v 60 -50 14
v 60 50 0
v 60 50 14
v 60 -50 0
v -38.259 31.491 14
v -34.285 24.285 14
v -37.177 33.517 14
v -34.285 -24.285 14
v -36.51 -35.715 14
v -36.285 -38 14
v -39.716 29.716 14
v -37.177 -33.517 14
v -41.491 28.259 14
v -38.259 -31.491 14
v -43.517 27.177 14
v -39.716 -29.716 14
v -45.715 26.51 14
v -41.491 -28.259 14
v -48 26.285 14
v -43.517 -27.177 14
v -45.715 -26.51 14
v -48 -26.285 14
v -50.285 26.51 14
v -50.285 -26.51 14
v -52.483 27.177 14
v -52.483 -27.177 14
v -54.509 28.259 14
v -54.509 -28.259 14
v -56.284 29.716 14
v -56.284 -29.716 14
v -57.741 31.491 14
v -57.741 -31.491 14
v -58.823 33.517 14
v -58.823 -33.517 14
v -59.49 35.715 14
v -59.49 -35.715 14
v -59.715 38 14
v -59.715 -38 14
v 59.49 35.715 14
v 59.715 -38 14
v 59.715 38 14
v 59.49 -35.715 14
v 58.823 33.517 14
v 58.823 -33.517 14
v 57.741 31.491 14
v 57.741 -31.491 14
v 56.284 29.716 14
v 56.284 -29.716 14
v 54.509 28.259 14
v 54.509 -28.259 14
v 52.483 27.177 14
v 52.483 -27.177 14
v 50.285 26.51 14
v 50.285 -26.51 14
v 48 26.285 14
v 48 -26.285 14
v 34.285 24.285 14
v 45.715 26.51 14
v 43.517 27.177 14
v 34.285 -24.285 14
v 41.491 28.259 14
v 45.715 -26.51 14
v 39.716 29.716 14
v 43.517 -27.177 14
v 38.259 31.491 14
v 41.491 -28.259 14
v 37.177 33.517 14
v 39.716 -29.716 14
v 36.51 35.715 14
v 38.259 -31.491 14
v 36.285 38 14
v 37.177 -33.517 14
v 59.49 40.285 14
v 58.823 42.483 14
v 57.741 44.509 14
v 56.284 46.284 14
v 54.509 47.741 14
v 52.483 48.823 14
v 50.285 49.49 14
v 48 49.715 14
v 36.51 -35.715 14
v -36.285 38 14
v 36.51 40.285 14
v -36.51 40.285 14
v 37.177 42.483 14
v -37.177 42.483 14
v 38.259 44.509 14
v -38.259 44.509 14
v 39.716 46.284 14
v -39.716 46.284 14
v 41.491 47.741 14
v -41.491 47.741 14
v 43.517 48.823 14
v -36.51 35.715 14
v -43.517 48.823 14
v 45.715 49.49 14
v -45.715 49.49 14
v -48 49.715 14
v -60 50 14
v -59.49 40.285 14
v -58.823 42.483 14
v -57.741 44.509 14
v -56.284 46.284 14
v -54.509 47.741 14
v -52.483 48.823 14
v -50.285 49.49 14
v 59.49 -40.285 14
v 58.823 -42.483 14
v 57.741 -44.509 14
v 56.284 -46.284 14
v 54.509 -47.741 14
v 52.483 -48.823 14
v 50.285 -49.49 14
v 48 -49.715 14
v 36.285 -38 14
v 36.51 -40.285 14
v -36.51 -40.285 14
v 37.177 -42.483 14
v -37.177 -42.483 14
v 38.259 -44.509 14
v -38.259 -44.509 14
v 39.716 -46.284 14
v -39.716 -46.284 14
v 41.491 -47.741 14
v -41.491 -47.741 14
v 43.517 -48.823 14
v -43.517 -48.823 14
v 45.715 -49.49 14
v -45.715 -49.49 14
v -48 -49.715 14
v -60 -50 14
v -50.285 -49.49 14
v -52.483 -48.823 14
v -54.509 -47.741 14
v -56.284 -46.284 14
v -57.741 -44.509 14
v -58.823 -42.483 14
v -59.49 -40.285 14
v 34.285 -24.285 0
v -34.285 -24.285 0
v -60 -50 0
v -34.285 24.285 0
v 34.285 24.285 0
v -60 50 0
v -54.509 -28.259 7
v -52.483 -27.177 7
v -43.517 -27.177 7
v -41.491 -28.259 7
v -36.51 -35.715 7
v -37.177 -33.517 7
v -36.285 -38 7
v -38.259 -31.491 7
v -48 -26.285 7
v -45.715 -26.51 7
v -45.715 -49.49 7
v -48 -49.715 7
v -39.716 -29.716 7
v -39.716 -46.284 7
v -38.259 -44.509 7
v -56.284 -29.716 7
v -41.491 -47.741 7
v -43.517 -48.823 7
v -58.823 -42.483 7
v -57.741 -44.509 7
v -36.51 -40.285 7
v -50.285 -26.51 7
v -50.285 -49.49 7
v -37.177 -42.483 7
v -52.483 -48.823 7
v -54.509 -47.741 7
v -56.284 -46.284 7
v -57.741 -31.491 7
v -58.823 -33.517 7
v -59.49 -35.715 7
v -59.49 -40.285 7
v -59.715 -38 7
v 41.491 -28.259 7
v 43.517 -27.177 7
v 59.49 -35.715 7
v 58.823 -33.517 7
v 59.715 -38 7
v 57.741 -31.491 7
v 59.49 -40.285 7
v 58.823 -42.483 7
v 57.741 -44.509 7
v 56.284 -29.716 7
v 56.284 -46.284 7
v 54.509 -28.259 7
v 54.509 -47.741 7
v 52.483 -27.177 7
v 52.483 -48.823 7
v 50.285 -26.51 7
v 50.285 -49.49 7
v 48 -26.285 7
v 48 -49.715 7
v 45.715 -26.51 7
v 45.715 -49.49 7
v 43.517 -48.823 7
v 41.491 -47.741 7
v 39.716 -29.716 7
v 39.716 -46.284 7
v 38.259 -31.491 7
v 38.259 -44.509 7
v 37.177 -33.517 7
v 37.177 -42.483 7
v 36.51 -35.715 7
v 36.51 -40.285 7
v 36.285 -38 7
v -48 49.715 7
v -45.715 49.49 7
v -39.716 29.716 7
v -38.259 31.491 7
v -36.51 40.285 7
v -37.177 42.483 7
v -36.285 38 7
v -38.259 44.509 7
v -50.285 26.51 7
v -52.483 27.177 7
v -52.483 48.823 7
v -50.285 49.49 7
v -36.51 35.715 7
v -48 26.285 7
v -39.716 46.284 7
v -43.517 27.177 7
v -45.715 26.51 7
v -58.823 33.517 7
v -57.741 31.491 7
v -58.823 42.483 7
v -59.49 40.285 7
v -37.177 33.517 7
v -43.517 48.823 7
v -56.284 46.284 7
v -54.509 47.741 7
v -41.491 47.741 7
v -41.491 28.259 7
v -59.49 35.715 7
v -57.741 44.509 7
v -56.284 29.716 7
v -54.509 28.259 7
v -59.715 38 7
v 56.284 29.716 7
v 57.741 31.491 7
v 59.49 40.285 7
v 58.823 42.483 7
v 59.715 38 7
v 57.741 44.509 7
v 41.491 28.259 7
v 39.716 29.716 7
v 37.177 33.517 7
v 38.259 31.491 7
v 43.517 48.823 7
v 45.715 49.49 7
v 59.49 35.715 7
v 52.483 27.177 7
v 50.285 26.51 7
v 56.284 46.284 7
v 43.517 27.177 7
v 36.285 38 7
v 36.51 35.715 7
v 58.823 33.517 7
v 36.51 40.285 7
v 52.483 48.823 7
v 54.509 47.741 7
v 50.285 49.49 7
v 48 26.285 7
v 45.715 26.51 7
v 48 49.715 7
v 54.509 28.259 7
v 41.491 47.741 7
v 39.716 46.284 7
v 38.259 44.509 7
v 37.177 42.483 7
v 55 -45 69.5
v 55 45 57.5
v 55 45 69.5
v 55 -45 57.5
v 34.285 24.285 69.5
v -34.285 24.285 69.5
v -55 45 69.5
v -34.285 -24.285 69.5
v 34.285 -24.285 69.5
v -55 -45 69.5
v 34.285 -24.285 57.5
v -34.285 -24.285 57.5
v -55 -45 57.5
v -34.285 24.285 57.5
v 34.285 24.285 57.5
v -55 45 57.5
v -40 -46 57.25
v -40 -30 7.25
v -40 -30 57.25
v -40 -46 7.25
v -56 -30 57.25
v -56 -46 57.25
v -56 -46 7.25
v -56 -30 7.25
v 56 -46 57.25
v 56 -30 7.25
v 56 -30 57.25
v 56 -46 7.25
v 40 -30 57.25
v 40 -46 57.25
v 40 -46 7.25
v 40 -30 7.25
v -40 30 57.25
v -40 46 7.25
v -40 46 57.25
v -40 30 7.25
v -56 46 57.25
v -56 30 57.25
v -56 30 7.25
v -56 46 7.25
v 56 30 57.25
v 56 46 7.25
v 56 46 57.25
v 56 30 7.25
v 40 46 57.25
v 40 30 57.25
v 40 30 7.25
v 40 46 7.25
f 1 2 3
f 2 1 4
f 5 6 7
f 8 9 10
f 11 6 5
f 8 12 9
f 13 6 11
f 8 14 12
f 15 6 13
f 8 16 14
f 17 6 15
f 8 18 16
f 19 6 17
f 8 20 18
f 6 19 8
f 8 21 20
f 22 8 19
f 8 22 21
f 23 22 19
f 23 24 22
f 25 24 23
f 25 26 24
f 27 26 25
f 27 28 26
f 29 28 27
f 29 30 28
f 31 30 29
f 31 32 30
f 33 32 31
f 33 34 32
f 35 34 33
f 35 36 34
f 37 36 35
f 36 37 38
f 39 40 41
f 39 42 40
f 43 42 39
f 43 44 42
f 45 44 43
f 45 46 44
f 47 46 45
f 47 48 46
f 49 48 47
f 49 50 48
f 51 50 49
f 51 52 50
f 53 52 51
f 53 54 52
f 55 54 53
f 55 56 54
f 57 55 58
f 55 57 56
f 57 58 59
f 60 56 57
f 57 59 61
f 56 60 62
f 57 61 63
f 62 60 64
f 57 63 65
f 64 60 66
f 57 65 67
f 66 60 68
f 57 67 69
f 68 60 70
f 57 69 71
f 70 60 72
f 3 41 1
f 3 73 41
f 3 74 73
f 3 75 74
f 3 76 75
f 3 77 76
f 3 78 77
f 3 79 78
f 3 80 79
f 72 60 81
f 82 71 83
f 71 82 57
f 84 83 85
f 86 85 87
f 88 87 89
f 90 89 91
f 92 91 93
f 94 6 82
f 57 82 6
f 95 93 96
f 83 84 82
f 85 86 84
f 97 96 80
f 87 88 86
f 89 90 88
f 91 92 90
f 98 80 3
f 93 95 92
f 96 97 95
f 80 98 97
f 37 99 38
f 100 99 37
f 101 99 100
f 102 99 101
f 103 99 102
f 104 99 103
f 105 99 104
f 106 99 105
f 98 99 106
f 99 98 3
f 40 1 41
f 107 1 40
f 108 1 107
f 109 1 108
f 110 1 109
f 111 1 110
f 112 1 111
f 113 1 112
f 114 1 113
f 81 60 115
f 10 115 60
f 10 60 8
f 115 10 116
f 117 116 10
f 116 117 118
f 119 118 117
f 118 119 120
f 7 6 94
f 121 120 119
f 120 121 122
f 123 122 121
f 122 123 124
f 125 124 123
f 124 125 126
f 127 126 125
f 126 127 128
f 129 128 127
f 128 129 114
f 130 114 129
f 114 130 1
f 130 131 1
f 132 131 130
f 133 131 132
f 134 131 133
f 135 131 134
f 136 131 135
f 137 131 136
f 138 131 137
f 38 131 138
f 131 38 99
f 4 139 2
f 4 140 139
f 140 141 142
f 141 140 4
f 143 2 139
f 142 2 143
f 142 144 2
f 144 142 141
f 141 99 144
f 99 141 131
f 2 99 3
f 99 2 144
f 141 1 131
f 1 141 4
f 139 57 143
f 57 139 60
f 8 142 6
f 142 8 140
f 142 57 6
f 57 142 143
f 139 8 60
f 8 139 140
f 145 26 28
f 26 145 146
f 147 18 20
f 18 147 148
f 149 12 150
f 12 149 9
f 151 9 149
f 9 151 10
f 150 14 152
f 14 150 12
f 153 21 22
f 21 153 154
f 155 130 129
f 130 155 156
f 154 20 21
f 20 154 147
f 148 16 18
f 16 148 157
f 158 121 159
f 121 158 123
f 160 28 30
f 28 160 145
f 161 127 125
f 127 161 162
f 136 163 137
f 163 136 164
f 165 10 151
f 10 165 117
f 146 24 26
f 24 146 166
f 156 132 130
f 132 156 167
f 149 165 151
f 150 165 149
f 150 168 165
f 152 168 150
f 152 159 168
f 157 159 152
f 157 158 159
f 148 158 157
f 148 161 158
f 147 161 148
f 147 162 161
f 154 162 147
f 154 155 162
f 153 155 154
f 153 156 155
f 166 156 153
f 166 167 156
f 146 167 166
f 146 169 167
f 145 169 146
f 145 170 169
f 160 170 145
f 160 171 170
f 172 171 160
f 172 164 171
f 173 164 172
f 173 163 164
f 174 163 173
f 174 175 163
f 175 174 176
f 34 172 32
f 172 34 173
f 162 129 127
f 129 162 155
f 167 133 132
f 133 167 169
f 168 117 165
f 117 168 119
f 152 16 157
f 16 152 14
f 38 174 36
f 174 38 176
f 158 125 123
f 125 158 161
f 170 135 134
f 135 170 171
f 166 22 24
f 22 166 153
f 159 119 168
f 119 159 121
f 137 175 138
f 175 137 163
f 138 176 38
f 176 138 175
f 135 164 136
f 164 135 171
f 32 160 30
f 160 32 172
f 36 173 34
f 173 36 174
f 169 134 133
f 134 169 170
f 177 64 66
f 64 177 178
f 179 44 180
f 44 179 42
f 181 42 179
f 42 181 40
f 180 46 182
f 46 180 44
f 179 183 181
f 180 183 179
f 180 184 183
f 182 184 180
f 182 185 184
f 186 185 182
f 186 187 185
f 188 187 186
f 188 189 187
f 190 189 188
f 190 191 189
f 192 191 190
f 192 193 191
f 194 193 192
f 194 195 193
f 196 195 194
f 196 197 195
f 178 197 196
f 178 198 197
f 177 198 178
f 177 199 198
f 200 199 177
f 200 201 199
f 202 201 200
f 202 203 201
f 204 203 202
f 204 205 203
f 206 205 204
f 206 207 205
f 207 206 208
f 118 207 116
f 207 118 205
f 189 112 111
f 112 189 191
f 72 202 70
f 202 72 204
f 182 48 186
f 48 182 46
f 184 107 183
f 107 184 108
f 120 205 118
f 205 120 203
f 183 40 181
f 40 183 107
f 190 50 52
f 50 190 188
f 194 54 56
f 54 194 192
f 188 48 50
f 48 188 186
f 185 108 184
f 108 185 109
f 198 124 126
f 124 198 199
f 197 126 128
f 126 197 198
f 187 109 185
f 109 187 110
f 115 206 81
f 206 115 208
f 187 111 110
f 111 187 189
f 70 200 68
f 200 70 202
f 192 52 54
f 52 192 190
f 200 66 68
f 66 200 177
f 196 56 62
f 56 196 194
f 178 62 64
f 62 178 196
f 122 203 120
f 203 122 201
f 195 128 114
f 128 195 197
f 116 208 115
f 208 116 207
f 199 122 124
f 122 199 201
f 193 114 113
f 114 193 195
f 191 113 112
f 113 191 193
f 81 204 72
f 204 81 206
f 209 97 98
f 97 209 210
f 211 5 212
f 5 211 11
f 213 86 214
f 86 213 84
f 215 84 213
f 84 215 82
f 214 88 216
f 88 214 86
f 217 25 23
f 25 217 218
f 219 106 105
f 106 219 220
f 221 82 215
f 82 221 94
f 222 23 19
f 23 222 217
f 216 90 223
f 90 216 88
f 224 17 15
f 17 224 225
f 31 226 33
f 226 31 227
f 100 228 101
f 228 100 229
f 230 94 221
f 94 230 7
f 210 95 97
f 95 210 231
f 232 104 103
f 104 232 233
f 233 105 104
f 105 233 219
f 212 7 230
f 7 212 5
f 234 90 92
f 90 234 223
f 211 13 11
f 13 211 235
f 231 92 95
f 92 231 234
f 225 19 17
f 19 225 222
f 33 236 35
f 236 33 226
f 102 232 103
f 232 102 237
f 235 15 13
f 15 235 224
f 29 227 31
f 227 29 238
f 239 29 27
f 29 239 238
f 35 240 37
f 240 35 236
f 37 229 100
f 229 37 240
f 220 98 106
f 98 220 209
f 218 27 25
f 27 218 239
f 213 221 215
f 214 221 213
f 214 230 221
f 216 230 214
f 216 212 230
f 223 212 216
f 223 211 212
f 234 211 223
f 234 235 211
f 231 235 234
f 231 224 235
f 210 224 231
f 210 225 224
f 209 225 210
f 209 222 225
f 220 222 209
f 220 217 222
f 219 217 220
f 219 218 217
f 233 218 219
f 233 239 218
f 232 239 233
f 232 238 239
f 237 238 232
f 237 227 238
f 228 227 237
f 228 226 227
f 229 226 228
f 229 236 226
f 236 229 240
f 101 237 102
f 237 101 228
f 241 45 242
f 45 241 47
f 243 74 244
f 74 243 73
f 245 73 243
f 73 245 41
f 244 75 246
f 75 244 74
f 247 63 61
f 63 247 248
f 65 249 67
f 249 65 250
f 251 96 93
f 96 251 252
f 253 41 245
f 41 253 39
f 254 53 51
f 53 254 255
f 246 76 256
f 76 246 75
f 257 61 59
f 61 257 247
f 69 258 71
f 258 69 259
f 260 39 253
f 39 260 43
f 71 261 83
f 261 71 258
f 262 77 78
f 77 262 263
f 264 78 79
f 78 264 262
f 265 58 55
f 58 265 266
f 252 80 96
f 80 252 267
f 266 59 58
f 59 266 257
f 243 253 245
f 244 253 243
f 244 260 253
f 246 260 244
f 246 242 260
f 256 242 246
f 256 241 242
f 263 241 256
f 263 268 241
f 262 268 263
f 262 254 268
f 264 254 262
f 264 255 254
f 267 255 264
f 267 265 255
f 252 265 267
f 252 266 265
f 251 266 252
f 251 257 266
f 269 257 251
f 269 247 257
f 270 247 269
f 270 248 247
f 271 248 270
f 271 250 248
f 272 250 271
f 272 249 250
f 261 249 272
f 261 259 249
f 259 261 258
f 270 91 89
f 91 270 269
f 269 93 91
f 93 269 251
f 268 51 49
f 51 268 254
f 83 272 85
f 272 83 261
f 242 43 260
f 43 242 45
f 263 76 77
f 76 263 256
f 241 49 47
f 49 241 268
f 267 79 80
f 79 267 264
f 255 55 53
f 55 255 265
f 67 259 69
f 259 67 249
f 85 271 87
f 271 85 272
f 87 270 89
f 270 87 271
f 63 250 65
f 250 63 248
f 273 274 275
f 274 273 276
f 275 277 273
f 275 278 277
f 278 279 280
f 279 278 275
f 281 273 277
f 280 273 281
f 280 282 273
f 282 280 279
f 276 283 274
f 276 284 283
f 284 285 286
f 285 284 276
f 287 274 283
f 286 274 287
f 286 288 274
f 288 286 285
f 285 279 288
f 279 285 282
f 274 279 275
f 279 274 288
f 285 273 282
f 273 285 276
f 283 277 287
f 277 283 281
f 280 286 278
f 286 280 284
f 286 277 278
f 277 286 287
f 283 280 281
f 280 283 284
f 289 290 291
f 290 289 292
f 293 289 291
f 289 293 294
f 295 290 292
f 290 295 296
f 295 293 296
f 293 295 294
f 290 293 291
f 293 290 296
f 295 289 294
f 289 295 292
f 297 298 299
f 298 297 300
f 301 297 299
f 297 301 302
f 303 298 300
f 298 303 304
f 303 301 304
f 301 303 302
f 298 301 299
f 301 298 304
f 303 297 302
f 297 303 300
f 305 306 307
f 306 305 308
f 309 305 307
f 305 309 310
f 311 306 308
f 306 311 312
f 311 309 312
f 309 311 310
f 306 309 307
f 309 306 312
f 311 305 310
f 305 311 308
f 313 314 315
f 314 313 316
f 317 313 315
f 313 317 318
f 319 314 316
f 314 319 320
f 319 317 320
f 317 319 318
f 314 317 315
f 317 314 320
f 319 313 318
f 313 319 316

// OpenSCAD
$fn = 32;

// ------------------------------------------------------------------------
// Frame cube: base 120 x 100 mm, posts 50 mm tall
// Every part is its own module, assembly() places every instance.
// ------------------------------------------------------------------------

// --- part 1 ---
module base_frame() {
  difference() {
    translate([-60, -50, 0]) cube([120, 100, 14]);
    translate([-34.285, -24.285, -1]) cube([68.57, 48.57, 16]);
    translate([-48, -38, 7]) cylinder(h = 8, d = 23.43);
    translate([48, -38, 7]) cylinder(h = 8, d = 23.43);
    translate([-48, 38, 7]) cylinder(h = 8, d = 23.43);
    translate([48, 38, 7]) cylinder(h = 8, d = 23.43);
  }
}

// --- part 2 ---
module corner_post() {
  translate([-8, -8, 0]) cube([16, 16, 50]);
}

// --- part 3 ---
module top_frame() {
  difference() {
    translate([-55, -45, 0]) cube([110, 90, 12]);
    translate([-34.285, -24.285, -1]) cube([68.57, 48.57, 14]);
  }
}

// --- assembly ---
module assembly() {
  color([0.80, 0.24, 0.20]) translate([0, 0, 0]) rotate([0, 0, 0]) base_frame();
  color([0.20, 0.45, 0.75]) translate([-48, -38, 7.25]) rotate([0, 0, 0]) corner_post();
  color([0.25, 0.62, 0.32]) translate([48, -38, 7.25]) rotate([0, 0, 0]) corner_post();
  color([0.92, 0.70, 0.18]) translate([-48, 38, 7.25]) rotate([0, 0, 0]) corner_post();
  color([0.58, 0.35, 0.70]) translate([48, 38, 7.25]) rotate([0, 0, 0]) corner_post();
  color([0.16, 0.66, 0.66]) translate([0, 0, 57.5]) rotate([0, 0, 0]) top_frame();
}

assembly();
